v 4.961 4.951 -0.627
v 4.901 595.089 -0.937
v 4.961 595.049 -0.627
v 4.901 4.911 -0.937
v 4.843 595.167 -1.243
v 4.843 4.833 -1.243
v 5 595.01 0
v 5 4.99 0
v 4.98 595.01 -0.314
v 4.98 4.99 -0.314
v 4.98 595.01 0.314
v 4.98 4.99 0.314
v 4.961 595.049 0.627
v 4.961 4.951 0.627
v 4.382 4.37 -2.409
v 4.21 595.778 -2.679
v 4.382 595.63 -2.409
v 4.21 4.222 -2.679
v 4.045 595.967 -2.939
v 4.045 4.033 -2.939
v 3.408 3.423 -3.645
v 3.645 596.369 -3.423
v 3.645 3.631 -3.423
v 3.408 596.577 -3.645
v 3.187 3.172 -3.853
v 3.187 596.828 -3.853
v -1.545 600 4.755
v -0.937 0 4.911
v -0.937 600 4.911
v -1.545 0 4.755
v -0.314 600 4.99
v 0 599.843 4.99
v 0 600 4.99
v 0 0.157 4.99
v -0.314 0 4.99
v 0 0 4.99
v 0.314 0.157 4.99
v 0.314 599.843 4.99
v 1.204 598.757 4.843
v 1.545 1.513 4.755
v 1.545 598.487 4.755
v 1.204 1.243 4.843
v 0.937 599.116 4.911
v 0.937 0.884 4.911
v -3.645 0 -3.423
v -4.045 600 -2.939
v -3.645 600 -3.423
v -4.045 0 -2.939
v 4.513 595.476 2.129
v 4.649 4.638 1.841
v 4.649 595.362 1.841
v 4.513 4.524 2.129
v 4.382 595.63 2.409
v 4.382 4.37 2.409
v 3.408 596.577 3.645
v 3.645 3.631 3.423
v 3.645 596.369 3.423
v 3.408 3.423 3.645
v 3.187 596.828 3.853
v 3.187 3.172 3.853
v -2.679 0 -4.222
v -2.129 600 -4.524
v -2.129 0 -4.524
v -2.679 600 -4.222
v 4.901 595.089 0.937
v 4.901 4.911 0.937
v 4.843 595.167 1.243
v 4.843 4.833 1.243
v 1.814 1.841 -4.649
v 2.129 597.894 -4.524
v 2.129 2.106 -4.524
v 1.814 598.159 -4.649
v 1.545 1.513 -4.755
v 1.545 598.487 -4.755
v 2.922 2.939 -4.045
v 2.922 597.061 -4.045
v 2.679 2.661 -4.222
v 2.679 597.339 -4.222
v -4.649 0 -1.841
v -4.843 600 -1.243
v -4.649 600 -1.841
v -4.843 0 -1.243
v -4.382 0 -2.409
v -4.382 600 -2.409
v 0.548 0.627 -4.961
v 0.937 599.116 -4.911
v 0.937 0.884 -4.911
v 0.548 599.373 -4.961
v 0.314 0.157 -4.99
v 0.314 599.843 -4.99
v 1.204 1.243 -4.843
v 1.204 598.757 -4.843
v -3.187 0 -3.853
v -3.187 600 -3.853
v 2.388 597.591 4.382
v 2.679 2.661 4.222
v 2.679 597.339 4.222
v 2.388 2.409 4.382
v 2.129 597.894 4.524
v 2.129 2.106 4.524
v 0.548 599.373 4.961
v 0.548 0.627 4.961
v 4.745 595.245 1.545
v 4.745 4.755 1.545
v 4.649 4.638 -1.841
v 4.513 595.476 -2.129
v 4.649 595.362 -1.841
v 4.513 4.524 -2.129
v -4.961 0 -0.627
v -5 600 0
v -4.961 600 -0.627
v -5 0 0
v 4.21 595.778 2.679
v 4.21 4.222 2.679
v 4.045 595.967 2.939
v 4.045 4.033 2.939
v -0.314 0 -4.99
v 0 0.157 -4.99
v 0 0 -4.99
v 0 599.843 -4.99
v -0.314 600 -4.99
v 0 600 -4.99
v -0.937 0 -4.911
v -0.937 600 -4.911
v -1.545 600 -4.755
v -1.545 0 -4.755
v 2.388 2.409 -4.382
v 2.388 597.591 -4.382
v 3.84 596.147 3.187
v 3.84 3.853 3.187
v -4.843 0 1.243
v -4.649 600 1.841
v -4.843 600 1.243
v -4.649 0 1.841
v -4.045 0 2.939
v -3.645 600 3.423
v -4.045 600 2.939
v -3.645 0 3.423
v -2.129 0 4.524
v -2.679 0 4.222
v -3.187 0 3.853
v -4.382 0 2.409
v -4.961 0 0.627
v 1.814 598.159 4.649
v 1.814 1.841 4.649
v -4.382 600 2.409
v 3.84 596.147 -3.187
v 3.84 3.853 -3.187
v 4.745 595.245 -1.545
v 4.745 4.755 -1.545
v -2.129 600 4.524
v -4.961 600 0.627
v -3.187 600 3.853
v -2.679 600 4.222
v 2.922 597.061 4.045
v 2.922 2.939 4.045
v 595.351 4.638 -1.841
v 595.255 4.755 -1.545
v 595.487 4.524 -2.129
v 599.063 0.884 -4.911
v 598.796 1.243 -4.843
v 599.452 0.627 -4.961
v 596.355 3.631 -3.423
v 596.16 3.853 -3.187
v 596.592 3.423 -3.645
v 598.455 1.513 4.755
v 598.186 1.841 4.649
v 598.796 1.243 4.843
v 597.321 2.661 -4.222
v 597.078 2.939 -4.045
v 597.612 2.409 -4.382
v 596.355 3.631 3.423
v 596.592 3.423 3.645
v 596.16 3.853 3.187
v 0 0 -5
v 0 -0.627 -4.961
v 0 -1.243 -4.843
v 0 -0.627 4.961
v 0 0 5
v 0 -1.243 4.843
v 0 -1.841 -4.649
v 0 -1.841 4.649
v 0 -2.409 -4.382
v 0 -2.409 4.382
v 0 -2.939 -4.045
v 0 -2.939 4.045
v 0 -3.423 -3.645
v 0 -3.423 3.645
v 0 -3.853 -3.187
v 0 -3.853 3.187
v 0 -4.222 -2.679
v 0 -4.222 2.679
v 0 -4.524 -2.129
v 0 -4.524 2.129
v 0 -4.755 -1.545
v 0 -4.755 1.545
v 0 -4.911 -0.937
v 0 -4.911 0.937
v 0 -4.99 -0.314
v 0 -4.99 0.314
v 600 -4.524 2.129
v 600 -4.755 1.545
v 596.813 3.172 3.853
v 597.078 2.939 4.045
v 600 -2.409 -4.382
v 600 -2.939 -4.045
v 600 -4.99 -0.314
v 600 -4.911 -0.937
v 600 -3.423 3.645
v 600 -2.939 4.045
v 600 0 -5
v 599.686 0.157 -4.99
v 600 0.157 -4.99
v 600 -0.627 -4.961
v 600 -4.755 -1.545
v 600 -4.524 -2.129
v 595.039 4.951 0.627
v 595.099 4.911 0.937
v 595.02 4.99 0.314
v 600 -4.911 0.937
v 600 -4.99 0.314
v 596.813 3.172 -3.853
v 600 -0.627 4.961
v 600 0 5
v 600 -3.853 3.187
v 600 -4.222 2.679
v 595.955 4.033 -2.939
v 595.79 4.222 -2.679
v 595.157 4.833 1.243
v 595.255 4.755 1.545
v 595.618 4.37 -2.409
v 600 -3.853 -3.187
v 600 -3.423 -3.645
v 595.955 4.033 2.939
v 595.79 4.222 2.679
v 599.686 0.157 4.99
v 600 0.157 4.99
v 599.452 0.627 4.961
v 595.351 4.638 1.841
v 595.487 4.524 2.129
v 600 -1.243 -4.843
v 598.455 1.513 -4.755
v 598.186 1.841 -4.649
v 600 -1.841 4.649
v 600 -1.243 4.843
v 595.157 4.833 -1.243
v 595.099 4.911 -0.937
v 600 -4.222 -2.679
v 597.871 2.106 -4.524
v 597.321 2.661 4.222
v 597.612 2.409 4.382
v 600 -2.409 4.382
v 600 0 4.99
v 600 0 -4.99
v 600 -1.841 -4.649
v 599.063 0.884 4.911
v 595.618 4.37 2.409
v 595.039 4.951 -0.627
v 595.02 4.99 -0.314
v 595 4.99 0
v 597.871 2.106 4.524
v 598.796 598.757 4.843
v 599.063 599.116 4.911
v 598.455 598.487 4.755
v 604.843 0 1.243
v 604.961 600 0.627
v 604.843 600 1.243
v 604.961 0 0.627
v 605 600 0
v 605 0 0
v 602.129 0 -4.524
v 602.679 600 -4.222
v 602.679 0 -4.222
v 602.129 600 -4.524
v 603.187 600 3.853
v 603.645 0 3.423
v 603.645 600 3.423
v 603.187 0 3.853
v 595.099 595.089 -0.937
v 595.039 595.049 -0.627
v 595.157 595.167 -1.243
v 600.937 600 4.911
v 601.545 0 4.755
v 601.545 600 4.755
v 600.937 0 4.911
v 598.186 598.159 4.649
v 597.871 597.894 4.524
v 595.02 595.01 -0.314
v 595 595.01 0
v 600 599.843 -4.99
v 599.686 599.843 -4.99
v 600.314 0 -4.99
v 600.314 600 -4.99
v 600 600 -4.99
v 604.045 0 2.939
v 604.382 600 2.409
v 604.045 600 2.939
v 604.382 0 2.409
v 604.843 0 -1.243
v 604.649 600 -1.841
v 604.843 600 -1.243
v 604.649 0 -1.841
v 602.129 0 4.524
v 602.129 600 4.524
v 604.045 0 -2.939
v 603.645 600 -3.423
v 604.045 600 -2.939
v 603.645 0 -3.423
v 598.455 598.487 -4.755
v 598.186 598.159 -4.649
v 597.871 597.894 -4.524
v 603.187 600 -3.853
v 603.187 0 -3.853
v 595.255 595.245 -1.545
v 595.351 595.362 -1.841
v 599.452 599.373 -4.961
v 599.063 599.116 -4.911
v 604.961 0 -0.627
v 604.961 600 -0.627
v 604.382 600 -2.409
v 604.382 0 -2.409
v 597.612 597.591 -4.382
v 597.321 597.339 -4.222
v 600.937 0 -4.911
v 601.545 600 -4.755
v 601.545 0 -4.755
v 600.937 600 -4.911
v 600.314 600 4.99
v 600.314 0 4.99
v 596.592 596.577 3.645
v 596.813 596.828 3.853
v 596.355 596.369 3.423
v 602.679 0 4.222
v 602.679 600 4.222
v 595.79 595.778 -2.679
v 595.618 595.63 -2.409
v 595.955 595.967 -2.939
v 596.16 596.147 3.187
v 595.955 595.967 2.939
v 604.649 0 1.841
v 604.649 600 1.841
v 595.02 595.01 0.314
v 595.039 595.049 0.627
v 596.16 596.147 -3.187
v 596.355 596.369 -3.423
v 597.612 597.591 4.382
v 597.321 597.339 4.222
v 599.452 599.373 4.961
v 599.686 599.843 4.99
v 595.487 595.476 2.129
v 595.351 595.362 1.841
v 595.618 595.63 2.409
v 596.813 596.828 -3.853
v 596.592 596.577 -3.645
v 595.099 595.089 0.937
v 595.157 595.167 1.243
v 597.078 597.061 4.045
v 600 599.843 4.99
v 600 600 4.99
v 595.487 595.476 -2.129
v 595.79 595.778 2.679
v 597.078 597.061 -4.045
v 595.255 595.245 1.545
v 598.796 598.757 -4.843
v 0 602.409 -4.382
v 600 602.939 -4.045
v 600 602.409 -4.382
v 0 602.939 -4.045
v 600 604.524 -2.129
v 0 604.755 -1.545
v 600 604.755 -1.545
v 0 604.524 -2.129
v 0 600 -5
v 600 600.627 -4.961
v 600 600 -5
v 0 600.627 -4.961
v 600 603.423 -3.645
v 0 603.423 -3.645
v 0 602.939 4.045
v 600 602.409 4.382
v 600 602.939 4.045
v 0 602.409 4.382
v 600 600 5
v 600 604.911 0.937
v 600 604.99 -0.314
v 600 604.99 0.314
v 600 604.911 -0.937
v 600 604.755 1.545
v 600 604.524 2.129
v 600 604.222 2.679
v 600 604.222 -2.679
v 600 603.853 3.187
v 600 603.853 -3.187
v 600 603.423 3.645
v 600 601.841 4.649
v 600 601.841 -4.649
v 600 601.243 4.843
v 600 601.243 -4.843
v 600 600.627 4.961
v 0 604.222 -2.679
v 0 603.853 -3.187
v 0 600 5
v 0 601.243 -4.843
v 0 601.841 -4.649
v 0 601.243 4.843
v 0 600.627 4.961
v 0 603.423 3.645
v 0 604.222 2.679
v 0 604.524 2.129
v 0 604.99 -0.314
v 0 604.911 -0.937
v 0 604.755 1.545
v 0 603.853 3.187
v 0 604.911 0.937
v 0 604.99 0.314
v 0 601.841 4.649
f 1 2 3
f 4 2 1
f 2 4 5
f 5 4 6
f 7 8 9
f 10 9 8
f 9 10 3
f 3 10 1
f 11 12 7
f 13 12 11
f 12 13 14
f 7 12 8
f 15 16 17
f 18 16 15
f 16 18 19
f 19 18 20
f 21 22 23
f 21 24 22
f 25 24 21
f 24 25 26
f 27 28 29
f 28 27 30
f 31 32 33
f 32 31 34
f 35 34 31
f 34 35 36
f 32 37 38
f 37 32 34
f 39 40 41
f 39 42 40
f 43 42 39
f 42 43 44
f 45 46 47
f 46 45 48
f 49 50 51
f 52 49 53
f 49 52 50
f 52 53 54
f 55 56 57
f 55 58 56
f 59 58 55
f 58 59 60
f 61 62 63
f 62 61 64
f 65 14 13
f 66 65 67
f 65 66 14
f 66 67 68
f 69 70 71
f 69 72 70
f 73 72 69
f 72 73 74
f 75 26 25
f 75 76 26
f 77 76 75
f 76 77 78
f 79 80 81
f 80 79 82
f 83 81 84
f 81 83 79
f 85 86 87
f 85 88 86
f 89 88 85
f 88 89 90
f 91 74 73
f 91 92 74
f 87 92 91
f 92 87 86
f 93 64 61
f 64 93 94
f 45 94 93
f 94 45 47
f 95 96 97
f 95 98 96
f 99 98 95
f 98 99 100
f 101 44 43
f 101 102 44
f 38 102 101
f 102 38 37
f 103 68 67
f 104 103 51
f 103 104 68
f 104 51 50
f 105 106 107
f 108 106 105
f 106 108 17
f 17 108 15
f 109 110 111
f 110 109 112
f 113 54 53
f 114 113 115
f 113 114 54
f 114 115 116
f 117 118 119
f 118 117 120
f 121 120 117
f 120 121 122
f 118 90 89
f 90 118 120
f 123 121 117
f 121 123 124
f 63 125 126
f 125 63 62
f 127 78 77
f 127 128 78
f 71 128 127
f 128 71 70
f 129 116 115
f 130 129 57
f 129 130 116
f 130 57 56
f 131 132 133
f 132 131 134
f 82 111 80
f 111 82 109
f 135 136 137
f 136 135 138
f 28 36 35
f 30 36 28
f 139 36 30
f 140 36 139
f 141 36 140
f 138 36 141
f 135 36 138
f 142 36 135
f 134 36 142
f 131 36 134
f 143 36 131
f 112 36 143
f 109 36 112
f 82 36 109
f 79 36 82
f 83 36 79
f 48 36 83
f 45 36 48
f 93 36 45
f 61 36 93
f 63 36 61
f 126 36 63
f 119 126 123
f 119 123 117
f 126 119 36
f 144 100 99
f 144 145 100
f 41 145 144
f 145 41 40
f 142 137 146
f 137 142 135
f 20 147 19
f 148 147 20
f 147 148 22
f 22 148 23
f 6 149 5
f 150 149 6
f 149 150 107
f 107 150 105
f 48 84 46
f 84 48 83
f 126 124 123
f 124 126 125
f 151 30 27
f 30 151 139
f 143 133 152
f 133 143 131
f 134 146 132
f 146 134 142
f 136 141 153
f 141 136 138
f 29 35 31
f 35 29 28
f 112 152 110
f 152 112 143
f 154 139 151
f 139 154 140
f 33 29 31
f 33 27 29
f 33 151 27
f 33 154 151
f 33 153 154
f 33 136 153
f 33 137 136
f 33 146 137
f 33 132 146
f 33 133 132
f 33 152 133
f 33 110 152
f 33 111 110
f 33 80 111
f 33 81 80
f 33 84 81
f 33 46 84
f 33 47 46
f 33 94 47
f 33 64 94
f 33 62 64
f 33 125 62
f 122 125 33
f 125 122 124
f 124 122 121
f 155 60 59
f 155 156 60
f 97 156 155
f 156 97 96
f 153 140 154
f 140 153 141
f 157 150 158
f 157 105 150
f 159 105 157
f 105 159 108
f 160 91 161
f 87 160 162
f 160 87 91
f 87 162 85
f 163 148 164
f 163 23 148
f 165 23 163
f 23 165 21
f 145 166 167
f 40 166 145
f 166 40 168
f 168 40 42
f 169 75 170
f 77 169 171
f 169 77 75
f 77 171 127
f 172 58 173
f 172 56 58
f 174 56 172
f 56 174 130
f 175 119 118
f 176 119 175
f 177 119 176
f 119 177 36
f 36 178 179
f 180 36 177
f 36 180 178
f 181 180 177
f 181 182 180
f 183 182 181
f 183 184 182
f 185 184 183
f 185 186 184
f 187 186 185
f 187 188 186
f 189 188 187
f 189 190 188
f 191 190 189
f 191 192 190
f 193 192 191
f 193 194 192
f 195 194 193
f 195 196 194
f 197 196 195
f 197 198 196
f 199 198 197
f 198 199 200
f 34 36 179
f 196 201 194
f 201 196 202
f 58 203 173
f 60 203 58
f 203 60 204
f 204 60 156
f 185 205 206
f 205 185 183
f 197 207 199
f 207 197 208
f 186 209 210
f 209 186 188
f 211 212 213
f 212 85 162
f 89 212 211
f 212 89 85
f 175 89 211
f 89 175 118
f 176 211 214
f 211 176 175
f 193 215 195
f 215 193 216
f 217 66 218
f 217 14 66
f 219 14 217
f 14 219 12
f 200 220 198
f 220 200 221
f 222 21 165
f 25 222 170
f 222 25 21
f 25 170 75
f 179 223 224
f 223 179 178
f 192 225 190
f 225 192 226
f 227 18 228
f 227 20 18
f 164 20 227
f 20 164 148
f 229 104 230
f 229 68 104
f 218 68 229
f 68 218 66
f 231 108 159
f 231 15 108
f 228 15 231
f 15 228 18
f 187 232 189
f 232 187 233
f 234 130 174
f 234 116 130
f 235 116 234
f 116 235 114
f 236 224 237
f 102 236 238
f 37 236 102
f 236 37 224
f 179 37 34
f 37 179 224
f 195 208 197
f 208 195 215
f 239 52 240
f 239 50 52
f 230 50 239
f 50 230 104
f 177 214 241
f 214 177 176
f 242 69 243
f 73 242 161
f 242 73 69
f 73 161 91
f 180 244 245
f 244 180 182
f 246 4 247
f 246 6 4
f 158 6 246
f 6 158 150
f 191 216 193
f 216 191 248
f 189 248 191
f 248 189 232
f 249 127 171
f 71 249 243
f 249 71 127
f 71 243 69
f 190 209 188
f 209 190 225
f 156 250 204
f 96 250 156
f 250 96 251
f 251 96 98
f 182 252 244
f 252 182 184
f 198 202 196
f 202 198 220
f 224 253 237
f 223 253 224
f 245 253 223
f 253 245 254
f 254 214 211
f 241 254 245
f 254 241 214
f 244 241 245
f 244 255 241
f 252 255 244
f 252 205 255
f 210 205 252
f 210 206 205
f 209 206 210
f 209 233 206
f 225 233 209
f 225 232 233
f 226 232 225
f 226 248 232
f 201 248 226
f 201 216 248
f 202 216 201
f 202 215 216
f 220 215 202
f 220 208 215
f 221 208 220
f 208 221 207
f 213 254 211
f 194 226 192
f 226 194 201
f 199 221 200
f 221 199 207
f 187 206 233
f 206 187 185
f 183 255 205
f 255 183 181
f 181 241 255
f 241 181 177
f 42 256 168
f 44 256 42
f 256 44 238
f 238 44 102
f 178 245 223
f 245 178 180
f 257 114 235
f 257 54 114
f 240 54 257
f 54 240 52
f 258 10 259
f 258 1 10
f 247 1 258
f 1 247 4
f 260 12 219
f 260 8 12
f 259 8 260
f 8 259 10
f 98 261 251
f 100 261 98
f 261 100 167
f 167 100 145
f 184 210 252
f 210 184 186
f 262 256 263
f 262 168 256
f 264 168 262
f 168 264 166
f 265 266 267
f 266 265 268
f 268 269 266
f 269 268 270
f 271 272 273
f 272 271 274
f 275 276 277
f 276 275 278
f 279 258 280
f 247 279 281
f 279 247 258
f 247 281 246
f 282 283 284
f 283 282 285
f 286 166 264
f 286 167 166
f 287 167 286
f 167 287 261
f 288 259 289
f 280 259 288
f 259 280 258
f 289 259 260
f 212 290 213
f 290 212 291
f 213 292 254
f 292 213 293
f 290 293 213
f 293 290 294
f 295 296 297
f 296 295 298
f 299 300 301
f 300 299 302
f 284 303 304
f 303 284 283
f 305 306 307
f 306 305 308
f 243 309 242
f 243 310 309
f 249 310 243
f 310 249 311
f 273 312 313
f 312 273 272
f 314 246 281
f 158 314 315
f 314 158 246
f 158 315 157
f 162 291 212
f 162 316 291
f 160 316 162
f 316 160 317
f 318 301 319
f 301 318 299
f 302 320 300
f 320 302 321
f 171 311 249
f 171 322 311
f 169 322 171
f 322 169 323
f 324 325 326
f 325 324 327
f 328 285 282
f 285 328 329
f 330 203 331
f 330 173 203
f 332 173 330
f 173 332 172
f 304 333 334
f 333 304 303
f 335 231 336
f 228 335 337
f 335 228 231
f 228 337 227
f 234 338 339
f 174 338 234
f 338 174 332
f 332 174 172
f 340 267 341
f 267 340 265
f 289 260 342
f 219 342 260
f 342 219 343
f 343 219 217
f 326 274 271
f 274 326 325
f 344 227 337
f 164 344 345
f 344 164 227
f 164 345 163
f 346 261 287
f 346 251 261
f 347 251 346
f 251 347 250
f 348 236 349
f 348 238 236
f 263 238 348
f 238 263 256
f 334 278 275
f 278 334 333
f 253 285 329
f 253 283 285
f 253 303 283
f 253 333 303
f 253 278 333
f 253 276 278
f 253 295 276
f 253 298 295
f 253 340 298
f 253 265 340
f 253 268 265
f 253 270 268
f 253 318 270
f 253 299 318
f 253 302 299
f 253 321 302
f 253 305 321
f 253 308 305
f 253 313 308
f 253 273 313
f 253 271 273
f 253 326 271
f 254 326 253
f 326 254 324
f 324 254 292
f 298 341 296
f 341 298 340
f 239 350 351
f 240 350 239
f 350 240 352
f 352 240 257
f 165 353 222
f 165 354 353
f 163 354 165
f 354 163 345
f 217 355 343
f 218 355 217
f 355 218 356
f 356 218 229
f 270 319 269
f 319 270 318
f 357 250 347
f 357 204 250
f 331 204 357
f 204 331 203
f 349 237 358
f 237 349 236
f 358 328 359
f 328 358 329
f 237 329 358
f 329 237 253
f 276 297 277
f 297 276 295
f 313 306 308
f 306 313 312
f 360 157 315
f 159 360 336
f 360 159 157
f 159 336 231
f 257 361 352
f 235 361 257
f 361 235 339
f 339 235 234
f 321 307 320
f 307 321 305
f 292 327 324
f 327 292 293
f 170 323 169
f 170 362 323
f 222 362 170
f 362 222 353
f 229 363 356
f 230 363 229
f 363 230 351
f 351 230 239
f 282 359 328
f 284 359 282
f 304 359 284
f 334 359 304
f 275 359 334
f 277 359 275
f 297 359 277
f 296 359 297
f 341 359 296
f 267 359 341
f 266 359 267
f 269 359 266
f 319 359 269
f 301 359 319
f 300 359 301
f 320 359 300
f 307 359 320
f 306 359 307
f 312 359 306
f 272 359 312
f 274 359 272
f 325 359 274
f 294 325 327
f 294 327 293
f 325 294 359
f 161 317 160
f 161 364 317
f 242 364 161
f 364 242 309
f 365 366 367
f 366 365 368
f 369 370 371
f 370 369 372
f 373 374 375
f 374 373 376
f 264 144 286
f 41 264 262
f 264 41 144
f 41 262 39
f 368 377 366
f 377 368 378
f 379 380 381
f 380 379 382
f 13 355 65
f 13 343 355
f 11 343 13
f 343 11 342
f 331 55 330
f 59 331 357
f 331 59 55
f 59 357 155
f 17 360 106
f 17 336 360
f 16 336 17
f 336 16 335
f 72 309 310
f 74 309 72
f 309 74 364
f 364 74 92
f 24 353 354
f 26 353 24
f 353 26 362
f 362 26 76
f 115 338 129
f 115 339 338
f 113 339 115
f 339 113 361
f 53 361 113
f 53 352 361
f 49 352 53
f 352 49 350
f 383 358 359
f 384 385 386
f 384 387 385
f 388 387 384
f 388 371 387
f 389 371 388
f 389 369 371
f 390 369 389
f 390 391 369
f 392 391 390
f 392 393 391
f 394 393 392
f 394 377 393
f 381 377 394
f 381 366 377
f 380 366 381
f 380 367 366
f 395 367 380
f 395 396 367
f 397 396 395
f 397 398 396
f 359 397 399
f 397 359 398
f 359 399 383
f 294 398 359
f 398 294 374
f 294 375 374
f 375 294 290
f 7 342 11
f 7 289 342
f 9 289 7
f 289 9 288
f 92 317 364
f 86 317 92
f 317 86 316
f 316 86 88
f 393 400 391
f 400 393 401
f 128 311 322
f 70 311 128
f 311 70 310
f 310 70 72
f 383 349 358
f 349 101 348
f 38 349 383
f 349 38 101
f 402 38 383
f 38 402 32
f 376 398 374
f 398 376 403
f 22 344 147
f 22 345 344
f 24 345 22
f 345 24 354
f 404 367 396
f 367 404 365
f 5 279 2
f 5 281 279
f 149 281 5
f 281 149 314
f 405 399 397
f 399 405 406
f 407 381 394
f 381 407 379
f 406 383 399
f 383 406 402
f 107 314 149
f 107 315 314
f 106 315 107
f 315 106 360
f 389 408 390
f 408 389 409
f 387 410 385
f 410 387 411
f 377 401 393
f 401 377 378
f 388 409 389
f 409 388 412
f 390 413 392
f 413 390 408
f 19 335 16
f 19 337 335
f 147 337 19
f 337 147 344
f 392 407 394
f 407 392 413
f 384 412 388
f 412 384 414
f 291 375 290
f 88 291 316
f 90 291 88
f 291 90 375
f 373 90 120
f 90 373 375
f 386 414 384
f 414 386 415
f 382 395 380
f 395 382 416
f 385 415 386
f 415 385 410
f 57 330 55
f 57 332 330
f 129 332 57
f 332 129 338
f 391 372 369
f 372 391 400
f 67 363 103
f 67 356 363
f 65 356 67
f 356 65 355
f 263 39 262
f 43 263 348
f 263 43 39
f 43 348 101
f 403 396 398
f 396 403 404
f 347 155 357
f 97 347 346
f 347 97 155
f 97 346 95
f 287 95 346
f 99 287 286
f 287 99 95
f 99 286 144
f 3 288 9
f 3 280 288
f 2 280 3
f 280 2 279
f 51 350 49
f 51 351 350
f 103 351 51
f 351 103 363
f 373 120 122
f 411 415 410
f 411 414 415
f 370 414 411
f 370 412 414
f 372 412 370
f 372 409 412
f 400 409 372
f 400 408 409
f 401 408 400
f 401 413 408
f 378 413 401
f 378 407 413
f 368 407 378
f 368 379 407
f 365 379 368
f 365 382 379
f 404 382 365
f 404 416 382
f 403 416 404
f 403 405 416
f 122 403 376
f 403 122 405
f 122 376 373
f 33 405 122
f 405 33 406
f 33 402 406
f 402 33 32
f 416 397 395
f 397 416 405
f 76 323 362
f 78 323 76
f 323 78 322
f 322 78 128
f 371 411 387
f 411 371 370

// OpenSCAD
$fn=50;
rotate([-90, 0, 0]) cylinder(d=10, h=600);
rotate([0, 90, 0]) cylinder(d=10, h=600);
translate([600, 600, 0]) rotate([90, 0, 0]) cylinder(d=10, h=600);
translate([0, 600, 0]) rotate([0, 90, 0]) cylinder(d=10, h=600);
